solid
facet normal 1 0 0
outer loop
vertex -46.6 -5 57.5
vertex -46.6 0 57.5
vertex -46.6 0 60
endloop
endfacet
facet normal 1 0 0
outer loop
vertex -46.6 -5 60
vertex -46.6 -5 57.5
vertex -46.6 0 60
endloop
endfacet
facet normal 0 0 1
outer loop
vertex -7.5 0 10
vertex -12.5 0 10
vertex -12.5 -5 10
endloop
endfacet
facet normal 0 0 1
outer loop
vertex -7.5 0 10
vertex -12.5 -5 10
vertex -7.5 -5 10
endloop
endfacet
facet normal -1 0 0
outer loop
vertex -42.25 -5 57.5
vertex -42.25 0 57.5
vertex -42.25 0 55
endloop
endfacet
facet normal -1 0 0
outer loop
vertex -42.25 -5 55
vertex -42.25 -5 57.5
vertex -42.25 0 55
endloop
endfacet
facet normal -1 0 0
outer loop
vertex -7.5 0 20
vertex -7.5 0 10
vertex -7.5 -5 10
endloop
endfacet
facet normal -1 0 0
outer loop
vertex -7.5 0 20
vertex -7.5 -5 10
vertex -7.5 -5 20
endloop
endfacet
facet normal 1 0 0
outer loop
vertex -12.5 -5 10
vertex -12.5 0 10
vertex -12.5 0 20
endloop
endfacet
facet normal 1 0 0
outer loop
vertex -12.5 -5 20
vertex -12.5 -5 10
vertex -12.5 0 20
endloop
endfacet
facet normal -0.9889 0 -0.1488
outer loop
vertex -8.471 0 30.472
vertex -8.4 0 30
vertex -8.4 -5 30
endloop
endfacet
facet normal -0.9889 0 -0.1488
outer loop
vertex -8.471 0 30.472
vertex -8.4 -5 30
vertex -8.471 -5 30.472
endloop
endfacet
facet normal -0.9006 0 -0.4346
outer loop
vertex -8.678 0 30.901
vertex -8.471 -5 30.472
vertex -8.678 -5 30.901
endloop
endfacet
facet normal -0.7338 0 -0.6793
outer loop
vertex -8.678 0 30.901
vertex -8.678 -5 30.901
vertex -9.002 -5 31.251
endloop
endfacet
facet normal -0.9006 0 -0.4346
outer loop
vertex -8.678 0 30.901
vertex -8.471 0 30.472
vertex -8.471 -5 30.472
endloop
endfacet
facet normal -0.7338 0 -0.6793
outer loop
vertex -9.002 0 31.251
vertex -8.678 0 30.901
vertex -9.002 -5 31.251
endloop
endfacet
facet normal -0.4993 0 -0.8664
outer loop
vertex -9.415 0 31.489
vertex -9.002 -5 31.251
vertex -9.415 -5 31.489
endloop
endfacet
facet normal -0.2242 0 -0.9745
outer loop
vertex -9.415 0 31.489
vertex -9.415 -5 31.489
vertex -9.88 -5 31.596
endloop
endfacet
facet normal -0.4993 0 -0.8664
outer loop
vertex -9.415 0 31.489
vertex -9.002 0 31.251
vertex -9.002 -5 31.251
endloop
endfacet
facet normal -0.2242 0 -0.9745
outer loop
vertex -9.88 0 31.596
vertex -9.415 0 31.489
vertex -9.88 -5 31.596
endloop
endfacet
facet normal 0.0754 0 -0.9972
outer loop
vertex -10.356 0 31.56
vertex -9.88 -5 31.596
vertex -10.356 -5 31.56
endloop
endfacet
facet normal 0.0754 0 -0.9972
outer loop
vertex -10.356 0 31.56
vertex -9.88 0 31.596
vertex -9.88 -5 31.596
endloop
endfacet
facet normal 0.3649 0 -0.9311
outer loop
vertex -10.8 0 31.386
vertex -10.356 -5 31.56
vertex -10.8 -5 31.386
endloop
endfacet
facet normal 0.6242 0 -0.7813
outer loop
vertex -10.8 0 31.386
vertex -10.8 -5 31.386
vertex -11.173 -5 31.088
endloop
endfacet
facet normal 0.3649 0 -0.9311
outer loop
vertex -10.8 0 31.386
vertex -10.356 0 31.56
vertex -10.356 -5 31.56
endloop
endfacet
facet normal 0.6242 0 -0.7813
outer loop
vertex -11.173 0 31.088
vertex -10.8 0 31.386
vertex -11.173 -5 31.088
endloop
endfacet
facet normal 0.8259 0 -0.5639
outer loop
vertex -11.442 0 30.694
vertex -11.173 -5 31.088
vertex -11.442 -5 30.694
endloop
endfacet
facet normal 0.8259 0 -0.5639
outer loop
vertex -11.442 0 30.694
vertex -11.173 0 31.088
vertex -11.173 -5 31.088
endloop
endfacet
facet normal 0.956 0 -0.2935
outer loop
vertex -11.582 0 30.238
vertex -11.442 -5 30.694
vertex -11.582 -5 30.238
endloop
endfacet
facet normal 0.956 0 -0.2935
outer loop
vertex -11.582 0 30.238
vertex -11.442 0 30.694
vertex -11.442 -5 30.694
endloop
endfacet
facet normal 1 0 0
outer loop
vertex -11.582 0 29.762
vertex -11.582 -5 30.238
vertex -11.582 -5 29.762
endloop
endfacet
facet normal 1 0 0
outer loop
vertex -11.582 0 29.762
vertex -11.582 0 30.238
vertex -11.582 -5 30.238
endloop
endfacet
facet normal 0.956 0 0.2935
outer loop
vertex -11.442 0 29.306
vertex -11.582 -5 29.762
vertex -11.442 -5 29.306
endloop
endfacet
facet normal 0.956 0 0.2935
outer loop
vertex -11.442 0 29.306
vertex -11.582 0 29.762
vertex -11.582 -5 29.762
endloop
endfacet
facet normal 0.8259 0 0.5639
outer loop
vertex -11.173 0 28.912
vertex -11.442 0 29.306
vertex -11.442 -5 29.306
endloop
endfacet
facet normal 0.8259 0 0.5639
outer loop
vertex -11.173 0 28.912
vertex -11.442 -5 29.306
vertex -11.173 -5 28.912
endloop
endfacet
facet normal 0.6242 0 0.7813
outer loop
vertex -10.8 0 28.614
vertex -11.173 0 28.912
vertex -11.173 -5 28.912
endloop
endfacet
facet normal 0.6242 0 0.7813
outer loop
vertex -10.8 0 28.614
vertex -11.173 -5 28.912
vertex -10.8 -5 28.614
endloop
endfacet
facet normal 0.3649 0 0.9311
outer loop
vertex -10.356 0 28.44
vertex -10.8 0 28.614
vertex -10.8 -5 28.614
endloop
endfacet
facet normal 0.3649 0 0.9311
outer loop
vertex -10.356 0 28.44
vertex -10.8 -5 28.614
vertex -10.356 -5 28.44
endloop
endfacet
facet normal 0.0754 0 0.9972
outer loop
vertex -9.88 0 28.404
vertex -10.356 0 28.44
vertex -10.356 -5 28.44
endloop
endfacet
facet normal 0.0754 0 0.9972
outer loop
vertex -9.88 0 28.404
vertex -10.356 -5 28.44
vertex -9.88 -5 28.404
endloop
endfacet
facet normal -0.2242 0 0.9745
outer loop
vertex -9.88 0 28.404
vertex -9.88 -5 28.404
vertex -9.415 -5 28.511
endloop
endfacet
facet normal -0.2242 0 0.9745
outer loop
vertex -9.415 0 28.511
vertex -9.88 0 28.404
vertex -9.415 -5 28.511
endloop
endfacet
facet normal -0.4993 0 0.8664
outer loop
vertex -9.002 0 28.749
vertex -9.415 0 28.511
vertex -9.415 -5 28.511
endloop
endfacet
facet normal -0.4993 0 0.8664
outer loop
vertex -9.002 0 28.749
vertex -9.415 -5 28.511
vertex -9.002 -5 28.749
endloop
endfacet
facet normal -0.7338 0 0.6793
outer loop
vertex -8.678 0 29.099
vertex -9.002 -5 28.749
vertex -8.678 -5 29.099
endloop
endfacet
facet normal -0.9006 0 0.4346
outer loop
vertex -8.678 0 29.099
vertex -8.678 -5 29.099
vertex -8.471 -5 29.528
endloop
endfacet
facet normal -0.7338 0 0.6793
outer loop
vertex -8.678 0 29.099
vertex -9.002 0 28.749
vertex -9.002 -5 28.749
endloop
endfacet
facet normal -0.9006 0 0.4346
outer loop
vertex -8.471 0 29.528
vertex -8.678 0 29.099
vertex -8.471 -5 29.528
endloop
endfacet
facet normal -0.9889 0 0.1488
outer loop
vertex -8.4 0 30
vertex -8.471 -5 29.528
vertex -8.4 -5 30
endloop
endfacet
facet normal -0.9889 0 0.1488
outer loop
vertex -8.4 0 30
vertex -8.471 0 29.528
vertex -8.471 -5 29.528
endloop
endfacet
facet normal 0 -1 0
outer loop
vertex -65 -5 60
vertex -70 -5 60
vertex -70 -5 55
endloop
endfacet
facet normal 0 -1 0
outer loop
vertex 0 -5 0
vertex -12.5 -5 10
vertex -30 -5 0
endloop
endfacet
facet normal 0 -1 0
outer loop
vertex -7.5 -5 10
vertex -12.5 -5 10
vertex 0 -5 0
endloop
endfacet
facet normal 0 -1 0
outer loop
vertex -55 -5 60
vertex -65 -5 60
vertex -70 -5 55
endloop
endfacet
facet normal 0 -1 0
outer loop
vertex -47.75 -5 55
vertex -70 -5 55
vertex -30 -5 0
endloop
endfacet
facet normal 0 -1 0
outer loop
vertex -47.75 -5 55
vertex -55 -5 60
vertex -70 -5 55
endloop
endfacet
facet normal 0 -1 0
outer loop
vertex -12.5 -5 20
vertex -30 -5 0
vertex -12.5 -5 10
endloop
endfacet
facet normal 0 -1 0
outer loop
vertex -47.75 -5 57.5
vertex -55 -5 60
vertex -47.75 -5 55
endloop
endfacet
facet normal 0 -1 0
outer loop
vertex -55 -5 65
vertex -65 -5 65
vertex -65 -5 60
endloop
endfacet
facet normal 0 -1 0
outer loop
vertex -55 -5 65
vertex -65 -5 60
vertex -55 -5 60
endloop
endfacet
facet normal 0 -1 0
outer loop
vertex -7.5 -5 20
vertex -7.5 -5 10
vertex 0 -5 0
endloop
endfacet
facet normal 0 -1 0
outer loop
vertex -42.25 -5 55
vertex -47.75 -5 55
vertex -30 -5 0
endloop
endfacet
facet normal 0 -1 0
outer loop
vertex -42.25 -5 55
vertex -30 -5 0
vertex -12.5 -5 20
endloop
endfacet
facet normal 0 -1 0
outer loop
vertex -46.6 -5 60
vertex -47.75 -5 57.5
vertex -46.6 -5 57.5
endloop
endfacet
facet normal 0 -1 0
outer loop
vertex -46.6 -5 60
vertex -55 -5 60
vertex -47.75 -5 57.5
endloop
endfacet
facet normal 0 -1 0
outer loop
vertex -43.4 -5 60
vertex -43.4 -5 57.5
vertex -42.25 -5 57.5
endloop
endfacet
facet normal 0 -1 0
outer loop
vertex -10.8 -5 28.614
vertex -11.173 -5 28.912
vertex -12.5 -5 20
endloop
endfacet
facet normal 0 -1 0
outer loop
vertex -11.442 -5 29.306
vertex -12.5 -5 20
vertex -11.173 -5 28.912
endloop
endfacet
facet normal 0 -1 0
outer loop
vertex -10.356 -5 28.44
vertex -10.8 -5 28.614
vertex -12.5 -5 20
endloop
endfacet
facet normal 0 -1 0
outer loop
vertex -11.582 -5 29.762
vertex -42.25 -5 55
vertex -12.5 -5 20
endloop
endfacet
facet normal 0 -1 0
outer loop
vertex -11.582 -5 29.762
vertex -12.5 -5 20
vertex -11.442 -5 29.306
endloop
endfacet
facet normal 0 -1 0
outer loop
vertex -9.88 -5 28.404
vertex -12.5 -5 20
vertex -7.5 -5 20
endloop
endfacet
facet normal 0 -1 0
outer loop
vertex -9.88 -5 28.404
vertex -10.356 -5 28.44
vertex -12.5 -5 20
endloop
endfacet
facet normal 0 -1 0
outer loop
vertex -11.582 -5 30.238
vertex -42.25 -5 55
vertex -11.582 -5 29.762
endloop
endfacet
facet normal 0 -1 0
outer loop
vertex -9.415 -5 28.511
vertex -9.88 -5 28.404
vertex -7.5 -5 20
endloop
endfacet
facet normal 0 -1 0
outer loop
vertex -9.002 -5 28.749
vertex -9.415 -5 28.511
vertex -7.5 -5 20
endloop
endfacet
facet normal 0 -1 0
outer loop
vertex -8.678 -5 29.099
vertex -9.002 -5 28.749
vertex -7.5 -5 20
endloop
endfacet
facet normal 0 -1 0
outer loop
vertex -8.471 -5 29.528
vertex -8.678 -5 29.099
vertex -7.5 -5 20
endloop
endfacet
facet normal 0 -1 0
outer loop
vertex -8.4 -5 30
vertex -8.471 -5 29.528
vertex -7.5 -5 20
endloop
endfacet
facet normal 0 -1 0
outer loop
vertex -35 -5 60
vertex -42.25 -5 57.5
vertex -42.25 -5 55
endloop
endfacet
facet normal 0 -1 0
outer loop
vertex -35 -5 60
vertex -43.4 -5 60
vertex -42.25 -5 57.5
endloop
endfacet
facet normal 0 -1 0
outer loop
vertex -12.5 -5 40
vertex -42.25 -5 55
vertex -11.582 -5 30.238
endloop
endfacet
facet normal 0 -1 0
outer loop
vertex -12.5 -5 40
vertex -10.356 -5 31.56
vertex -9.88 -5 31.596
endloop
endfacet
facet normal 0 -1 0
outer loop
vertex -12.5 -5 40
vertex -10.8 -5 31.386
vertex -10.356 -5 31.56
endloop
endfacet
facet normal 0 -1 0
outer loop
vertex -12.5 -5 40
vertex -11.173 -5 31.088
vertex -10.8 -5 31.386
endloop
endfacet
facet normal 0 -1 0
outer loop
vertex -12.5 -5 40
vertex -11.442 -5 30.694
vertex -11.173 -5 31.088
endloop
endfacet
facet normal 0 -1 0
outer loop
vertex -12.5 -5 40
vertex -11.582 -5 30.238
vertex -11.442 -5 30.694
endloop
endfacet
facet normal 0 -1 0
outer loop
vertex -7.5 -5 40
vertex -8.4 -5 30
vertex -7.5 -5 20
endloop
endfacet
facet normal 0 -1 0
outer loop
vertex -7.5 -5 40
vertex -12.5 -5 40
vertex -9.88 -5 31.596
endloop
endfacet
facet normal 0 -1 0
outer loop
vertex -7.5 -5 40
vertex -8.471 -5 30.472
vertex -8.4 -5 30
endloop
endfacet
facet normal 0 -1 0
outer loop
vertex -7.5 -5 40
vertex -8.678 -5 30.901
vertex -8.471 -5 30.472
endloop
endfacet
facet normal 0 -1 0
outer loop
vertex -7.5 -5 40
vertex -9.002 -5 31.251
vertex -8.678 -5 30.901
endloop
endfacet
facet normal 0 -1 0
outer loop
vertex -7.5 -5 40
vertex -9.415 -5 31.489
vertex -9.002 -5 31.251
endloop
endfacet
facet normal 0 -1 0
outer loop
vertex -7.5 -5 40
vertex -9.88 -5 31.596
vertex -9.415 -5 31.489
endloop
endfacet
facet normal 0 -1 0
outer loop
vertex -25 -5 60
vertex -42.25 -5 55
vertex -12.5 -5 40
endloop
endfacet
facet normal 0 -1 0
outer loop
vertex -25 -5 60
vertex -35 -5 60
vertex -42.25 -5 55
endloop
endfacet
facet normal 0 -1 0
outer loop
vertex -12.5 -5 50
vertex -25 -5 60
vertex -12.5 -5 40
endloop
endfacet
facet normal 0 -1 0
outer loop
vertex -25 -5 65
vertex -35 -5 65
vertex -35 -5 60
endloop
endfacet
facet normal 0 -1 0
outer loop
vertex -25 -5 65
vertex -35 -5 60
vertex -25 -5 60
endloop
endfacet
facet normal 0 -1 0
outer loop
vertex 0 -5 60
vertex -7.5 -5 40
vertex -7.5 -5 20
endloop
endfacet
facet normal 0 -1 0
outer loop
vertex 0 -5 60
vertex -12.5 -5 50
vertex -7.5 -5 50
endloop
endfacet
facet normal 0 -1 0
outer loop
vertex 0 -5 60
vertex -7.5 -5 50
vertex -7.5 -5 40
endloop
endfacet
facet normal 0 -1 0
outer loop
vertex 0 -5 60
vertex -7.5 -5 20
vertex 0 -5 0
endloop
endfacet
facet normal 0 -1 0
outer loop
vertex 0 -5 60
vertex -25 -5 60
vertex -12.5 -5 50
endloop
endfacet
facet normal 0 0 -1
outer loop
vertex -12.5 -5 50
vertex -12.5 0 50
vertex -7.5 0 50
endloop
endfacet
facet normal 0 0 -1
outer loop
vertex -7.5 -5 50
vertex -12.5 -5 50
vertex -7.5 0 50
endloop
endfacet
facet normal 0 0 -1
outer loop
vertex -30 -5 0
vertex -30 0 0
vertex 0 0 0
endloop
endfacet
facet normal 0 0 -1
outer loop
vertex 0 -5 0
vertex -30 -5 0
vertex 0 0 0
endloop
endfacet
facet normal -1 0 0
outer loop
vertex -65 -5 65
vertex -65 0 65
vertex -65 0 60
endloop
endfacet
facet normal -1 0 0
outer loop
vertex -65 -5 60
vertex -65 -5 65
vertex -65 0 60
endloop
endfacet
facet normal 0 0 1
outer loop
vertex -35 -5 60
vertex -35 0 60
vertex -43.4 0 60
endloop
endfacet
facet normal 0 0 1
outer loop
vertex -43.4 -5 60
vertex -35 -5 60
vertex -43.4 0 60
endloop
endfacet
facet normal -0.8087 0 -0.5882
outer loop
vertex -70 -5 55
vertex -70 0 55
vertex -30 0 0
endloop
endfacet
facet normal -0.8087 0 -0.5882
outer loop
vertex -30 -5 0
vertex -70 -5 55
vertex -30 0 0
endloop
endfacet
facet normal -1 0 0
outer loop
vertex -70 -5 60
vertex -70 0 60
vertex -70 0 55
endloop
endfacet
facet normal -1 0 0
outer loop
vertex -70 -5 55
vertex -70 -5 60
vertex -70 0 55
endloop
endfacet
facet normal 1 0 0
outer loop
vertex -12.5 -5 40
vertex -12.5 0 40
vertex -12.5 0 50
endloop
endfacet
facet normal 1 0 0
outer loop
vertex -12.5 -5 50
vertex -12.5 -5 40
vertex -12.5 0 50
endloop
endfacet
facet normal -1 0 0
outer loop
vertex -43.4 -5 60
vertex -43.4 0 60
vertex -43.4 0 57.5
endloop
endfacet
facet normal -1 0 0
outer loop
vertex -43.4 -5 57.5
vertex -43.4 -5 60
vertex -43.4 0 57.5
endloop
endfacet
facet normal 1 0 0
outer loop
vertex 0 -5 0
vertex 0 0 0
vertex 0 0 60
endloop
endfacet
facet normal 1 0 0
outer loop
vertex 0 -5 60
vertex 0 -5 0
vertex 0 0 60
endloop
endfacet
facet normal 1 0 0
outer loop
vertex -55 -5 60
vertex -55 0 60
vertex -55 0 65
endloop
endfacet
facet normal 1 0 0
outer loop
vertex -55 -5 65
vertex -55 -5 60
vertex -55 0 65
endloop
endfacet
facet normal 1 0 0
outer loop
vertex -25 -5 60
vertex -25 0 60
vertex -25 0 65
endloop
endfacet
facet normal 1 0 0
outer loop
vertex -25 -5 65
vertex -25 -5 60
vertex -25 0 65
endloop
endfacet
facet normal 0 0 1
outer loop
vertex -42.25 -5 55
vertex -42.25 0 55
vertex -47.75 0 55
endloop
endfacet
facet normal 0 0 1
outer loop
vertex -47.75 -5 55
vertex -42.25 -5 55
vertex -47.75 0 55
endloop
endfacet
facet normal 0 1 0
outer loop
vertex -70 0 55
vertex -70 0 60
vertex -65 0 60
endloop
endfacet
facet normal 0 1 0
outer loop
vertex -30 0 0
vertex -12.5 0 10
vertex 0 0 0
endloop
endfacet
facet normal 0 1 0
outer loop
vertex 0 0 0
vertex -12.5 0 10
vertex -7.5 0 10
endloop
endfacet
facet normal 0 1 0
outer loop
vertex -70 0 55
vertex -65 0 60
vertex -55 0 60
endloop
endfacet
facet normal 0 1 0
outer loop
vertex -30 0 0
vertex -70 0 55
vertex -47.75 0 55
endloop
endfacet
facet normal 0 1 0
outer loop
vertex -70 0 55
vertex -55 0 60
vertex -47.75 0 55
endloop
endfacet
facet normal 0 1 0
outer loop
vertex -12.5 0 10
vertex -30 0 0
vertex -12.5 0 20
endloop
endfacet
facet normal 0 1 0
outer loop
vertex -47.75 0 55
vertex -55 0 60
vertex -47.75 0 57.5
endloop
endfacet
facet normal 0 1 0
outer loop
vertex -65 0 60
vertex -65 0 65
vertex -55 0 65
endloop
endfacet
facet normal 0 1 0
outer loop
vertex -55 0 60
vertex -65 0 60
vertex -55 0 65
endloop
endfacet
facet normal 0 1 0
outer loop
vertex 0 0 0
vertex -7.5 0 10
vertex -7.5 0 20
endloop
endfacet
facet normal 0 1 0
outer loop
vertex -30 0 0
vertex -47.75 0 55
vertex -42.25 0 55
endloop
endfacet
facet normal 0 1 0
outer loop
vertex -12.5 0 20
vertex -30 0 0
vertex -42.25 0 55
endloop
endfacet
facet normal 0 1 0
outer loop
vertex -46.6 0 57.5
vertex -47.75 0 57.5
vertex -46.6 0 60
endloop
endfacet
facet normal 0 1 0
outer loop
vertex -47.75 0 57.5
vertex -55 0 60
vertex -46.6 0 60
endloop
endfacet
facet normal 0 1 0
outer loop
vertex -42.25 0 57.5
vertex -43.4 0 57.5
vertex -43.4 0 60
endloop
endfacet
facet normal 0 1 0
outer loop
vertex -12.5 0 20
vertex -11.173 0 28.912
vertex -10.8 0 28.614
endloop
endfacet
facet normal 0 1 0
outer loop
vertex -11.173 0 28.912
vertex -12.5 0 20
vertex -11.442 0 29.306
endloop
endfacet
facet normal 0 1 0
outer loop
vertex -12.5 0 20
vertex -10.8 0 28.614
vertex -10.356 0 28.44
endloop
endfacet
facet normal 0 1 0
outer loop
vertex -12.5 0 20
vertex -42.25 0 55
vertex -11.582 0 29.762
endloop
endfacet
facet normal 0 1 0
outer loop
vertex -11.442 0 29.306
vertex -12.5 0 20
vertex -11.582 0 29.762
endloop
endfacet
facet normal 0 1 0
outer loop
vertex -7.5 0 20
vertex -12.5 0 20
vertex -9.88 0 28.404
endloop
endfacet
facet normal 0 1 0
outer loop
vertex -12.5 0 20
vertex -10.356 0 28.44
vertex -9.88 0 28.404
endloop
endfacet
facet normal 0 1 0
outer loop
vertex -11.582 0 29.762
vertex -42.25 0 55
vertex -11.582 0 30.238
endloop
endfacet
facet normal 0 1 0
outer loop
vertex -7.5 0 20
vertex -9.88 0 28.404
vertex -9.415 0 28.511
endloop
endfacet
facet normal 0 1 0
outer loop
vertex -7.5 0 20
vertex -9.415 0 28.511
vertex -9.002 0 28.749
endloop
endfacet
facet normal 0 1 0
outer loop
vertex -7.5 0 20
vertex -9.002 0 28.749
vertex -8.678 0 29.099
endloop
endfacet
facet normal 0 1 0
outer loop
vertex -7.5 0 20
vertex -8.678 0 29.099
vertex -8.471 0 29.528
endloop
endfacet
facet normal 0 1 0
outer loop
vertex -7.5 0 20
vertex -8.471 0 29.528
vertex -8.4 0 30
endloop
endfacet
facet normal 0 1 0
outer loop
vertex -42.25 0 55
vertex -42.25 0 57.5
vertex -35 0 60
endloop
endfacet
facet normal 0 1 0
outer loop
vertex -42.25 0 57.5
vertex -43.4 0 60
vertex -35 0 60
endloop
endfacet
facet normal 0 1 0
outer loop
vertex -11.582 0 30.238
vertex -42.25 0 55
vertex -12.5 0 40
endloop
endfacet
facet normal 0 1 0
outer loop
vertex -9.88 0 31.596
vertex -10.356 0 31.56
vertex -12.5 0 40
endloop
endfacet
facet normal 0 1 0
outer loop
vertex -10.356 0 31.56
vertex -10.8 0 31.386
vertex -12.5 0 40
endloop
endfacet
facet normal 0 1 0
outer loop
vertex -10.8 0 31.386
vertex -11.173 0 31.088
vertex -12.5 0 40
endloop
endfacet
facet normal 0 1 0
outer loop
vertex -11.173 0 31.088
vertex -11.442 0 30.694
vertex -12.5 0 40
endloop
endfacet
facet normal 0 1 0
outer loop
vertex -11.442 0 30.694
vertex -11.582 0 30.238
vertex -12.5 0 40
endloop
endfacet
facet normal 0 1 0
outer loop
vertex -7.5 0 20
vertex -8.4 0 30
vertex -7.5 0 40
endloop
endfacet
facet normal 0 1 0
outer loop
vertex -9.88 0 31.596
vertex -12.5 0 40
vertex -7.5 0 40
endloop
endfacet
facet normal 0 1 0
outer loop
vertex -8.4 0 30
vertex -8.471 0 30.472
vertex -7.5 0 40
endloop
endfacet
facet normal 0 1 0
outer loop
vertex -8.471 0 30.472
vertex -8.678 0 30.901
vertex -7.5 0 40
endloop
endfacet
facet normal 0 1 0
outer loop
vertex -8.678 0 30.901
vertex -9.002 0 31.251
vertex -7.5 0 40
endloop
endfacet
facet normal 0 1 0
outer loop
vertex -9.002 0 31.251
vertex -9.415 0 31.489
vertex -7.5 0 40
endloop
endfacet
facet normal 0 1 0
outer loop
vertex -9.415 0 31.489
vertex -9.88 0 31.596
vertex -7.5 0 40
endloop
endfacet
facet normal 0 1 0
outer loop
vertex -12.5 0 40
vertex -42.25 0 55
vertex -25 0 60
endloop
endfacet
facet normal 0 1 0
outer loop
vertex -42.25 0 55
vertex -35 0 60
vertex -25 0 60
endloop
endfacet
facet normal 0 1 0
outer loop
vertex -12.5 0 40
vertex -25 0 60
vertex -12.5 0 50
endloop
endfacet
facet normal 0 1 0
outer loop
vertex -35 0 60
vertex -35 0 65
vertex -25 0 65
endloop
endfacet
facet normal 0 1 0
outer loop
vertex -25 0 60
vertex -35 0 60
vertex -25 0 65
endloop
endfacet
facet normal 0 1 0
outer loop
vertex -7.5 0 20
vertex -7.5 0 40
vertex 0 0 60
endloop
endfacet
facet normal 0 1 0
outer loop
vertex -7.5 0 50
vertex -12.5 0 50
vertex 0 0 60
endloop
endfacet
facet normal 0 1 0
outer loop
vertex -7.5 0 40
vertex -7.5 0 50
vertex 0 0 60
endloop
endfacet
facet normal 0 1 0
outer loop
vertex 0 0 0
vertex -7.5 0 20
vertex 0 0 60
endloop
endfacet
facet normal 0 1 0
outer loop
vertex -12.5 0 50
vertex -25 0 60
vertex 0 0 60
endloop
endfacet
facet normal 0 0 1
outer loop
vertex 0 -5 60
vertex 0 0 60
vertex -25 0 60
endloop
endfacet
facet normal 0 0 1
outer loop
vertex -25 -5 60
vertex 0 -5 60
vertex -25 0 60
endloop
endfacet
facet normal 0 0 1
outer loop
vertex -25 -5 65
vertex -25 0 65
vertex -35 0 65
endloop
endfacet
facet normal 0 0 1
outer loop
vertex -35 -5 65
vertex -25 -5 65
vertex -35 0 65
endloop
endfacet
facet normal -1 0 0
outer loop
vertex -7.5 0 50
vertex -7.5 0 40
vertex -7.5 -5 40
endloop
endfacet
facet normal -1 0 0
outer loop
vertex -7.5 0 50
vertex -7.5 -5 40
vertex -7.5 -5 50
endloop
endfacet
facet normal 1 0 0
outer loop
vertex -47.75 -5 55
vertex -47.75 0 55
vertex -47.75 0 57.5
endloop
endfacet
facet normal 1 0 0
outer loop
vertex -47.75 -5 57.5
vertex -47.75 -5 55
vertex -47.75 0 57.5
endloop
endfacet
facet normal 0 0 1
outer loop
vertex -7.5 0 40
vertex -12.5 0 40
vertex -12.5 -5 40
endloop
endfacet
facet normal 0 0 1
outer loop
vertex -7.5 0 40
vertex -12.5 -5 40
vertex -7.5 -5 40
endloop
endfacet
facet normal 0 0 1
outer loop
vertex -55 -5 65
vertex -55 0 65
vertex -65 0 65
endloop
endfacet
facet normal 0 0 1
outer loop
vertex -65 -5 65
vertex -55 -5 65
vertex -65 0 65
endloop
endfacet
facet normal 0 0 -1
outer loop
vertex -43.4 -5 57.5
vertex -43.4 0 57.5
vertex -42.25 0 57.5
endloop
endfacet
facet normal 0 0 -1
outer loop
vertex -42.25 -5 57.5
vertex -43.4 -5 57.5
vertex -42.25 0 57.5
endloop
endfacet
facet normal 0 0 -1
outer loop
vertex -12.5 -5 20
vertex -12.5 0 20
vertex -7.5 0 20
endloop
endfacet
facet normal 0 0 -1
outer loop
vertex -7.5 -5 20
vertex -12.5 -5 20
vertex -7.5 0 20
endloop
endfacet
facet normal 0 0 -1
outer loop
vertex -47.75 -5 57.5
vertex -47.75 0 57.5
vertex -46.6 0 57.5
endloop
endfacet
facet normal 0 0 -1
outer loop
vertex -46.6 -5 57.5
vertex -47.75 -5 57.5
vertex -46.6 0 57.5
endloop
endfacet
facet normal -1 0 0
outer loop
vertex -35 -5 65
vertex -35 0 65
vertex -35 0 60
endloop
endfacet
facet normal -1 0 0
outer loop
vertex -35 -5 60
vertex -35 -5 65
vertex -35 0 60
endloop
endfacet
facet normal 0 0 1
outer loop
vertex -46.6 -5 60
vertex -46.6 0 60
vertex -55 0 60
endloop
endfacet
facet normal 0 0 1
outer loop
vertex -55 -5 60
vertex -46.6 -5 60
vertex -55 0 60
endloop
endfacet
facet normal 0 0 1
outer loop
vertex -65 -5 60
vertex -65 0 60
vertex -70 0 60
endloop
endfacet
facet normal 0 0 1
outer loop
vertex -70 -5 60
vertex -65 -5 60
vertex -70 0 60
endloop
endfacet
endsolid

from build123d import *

# Parameters (mm, degrees)
F1_W     = 5
F1_H     = 10
F1_R     = 1.6
F2_DEPTH = 5


with BuildPart() as f2:
    # F1 (on Front) → F2 (new body)
    with BuildSketch(Plane.XZ):
        Polygon((-30, 0), (0, 0), (0, 60), (-25, 60), (-25, 65), (-35, 65), (-35, 60), (-43.4, 60), (-43.4, 57.5), (-42.25, 57.5), (-42.25, 55), (-45, 55), (-47.75, 55), (-47.75, 57.5), (-46.6, 57.5), (-46.6, 60), (-55, 60), (-55, 65), (-65, 65), (-65, 60), (-70, 60), (-70, 55), align=None)
        with Locations((-10, 15)):
            Rectangle(F1_W, F1_H, mode=Mode.SUBTRACT)
        with Locations((-10, 30)):
            Circle(F1_R, mode=Mode.SUBTRACT)
        with Locations((-10, 45)):
            Rectangle(F1_W, F1_H, mode=Mode.SUBTRACT)
    extrude(amount=F2_DEPTH)


solid = f2.part
